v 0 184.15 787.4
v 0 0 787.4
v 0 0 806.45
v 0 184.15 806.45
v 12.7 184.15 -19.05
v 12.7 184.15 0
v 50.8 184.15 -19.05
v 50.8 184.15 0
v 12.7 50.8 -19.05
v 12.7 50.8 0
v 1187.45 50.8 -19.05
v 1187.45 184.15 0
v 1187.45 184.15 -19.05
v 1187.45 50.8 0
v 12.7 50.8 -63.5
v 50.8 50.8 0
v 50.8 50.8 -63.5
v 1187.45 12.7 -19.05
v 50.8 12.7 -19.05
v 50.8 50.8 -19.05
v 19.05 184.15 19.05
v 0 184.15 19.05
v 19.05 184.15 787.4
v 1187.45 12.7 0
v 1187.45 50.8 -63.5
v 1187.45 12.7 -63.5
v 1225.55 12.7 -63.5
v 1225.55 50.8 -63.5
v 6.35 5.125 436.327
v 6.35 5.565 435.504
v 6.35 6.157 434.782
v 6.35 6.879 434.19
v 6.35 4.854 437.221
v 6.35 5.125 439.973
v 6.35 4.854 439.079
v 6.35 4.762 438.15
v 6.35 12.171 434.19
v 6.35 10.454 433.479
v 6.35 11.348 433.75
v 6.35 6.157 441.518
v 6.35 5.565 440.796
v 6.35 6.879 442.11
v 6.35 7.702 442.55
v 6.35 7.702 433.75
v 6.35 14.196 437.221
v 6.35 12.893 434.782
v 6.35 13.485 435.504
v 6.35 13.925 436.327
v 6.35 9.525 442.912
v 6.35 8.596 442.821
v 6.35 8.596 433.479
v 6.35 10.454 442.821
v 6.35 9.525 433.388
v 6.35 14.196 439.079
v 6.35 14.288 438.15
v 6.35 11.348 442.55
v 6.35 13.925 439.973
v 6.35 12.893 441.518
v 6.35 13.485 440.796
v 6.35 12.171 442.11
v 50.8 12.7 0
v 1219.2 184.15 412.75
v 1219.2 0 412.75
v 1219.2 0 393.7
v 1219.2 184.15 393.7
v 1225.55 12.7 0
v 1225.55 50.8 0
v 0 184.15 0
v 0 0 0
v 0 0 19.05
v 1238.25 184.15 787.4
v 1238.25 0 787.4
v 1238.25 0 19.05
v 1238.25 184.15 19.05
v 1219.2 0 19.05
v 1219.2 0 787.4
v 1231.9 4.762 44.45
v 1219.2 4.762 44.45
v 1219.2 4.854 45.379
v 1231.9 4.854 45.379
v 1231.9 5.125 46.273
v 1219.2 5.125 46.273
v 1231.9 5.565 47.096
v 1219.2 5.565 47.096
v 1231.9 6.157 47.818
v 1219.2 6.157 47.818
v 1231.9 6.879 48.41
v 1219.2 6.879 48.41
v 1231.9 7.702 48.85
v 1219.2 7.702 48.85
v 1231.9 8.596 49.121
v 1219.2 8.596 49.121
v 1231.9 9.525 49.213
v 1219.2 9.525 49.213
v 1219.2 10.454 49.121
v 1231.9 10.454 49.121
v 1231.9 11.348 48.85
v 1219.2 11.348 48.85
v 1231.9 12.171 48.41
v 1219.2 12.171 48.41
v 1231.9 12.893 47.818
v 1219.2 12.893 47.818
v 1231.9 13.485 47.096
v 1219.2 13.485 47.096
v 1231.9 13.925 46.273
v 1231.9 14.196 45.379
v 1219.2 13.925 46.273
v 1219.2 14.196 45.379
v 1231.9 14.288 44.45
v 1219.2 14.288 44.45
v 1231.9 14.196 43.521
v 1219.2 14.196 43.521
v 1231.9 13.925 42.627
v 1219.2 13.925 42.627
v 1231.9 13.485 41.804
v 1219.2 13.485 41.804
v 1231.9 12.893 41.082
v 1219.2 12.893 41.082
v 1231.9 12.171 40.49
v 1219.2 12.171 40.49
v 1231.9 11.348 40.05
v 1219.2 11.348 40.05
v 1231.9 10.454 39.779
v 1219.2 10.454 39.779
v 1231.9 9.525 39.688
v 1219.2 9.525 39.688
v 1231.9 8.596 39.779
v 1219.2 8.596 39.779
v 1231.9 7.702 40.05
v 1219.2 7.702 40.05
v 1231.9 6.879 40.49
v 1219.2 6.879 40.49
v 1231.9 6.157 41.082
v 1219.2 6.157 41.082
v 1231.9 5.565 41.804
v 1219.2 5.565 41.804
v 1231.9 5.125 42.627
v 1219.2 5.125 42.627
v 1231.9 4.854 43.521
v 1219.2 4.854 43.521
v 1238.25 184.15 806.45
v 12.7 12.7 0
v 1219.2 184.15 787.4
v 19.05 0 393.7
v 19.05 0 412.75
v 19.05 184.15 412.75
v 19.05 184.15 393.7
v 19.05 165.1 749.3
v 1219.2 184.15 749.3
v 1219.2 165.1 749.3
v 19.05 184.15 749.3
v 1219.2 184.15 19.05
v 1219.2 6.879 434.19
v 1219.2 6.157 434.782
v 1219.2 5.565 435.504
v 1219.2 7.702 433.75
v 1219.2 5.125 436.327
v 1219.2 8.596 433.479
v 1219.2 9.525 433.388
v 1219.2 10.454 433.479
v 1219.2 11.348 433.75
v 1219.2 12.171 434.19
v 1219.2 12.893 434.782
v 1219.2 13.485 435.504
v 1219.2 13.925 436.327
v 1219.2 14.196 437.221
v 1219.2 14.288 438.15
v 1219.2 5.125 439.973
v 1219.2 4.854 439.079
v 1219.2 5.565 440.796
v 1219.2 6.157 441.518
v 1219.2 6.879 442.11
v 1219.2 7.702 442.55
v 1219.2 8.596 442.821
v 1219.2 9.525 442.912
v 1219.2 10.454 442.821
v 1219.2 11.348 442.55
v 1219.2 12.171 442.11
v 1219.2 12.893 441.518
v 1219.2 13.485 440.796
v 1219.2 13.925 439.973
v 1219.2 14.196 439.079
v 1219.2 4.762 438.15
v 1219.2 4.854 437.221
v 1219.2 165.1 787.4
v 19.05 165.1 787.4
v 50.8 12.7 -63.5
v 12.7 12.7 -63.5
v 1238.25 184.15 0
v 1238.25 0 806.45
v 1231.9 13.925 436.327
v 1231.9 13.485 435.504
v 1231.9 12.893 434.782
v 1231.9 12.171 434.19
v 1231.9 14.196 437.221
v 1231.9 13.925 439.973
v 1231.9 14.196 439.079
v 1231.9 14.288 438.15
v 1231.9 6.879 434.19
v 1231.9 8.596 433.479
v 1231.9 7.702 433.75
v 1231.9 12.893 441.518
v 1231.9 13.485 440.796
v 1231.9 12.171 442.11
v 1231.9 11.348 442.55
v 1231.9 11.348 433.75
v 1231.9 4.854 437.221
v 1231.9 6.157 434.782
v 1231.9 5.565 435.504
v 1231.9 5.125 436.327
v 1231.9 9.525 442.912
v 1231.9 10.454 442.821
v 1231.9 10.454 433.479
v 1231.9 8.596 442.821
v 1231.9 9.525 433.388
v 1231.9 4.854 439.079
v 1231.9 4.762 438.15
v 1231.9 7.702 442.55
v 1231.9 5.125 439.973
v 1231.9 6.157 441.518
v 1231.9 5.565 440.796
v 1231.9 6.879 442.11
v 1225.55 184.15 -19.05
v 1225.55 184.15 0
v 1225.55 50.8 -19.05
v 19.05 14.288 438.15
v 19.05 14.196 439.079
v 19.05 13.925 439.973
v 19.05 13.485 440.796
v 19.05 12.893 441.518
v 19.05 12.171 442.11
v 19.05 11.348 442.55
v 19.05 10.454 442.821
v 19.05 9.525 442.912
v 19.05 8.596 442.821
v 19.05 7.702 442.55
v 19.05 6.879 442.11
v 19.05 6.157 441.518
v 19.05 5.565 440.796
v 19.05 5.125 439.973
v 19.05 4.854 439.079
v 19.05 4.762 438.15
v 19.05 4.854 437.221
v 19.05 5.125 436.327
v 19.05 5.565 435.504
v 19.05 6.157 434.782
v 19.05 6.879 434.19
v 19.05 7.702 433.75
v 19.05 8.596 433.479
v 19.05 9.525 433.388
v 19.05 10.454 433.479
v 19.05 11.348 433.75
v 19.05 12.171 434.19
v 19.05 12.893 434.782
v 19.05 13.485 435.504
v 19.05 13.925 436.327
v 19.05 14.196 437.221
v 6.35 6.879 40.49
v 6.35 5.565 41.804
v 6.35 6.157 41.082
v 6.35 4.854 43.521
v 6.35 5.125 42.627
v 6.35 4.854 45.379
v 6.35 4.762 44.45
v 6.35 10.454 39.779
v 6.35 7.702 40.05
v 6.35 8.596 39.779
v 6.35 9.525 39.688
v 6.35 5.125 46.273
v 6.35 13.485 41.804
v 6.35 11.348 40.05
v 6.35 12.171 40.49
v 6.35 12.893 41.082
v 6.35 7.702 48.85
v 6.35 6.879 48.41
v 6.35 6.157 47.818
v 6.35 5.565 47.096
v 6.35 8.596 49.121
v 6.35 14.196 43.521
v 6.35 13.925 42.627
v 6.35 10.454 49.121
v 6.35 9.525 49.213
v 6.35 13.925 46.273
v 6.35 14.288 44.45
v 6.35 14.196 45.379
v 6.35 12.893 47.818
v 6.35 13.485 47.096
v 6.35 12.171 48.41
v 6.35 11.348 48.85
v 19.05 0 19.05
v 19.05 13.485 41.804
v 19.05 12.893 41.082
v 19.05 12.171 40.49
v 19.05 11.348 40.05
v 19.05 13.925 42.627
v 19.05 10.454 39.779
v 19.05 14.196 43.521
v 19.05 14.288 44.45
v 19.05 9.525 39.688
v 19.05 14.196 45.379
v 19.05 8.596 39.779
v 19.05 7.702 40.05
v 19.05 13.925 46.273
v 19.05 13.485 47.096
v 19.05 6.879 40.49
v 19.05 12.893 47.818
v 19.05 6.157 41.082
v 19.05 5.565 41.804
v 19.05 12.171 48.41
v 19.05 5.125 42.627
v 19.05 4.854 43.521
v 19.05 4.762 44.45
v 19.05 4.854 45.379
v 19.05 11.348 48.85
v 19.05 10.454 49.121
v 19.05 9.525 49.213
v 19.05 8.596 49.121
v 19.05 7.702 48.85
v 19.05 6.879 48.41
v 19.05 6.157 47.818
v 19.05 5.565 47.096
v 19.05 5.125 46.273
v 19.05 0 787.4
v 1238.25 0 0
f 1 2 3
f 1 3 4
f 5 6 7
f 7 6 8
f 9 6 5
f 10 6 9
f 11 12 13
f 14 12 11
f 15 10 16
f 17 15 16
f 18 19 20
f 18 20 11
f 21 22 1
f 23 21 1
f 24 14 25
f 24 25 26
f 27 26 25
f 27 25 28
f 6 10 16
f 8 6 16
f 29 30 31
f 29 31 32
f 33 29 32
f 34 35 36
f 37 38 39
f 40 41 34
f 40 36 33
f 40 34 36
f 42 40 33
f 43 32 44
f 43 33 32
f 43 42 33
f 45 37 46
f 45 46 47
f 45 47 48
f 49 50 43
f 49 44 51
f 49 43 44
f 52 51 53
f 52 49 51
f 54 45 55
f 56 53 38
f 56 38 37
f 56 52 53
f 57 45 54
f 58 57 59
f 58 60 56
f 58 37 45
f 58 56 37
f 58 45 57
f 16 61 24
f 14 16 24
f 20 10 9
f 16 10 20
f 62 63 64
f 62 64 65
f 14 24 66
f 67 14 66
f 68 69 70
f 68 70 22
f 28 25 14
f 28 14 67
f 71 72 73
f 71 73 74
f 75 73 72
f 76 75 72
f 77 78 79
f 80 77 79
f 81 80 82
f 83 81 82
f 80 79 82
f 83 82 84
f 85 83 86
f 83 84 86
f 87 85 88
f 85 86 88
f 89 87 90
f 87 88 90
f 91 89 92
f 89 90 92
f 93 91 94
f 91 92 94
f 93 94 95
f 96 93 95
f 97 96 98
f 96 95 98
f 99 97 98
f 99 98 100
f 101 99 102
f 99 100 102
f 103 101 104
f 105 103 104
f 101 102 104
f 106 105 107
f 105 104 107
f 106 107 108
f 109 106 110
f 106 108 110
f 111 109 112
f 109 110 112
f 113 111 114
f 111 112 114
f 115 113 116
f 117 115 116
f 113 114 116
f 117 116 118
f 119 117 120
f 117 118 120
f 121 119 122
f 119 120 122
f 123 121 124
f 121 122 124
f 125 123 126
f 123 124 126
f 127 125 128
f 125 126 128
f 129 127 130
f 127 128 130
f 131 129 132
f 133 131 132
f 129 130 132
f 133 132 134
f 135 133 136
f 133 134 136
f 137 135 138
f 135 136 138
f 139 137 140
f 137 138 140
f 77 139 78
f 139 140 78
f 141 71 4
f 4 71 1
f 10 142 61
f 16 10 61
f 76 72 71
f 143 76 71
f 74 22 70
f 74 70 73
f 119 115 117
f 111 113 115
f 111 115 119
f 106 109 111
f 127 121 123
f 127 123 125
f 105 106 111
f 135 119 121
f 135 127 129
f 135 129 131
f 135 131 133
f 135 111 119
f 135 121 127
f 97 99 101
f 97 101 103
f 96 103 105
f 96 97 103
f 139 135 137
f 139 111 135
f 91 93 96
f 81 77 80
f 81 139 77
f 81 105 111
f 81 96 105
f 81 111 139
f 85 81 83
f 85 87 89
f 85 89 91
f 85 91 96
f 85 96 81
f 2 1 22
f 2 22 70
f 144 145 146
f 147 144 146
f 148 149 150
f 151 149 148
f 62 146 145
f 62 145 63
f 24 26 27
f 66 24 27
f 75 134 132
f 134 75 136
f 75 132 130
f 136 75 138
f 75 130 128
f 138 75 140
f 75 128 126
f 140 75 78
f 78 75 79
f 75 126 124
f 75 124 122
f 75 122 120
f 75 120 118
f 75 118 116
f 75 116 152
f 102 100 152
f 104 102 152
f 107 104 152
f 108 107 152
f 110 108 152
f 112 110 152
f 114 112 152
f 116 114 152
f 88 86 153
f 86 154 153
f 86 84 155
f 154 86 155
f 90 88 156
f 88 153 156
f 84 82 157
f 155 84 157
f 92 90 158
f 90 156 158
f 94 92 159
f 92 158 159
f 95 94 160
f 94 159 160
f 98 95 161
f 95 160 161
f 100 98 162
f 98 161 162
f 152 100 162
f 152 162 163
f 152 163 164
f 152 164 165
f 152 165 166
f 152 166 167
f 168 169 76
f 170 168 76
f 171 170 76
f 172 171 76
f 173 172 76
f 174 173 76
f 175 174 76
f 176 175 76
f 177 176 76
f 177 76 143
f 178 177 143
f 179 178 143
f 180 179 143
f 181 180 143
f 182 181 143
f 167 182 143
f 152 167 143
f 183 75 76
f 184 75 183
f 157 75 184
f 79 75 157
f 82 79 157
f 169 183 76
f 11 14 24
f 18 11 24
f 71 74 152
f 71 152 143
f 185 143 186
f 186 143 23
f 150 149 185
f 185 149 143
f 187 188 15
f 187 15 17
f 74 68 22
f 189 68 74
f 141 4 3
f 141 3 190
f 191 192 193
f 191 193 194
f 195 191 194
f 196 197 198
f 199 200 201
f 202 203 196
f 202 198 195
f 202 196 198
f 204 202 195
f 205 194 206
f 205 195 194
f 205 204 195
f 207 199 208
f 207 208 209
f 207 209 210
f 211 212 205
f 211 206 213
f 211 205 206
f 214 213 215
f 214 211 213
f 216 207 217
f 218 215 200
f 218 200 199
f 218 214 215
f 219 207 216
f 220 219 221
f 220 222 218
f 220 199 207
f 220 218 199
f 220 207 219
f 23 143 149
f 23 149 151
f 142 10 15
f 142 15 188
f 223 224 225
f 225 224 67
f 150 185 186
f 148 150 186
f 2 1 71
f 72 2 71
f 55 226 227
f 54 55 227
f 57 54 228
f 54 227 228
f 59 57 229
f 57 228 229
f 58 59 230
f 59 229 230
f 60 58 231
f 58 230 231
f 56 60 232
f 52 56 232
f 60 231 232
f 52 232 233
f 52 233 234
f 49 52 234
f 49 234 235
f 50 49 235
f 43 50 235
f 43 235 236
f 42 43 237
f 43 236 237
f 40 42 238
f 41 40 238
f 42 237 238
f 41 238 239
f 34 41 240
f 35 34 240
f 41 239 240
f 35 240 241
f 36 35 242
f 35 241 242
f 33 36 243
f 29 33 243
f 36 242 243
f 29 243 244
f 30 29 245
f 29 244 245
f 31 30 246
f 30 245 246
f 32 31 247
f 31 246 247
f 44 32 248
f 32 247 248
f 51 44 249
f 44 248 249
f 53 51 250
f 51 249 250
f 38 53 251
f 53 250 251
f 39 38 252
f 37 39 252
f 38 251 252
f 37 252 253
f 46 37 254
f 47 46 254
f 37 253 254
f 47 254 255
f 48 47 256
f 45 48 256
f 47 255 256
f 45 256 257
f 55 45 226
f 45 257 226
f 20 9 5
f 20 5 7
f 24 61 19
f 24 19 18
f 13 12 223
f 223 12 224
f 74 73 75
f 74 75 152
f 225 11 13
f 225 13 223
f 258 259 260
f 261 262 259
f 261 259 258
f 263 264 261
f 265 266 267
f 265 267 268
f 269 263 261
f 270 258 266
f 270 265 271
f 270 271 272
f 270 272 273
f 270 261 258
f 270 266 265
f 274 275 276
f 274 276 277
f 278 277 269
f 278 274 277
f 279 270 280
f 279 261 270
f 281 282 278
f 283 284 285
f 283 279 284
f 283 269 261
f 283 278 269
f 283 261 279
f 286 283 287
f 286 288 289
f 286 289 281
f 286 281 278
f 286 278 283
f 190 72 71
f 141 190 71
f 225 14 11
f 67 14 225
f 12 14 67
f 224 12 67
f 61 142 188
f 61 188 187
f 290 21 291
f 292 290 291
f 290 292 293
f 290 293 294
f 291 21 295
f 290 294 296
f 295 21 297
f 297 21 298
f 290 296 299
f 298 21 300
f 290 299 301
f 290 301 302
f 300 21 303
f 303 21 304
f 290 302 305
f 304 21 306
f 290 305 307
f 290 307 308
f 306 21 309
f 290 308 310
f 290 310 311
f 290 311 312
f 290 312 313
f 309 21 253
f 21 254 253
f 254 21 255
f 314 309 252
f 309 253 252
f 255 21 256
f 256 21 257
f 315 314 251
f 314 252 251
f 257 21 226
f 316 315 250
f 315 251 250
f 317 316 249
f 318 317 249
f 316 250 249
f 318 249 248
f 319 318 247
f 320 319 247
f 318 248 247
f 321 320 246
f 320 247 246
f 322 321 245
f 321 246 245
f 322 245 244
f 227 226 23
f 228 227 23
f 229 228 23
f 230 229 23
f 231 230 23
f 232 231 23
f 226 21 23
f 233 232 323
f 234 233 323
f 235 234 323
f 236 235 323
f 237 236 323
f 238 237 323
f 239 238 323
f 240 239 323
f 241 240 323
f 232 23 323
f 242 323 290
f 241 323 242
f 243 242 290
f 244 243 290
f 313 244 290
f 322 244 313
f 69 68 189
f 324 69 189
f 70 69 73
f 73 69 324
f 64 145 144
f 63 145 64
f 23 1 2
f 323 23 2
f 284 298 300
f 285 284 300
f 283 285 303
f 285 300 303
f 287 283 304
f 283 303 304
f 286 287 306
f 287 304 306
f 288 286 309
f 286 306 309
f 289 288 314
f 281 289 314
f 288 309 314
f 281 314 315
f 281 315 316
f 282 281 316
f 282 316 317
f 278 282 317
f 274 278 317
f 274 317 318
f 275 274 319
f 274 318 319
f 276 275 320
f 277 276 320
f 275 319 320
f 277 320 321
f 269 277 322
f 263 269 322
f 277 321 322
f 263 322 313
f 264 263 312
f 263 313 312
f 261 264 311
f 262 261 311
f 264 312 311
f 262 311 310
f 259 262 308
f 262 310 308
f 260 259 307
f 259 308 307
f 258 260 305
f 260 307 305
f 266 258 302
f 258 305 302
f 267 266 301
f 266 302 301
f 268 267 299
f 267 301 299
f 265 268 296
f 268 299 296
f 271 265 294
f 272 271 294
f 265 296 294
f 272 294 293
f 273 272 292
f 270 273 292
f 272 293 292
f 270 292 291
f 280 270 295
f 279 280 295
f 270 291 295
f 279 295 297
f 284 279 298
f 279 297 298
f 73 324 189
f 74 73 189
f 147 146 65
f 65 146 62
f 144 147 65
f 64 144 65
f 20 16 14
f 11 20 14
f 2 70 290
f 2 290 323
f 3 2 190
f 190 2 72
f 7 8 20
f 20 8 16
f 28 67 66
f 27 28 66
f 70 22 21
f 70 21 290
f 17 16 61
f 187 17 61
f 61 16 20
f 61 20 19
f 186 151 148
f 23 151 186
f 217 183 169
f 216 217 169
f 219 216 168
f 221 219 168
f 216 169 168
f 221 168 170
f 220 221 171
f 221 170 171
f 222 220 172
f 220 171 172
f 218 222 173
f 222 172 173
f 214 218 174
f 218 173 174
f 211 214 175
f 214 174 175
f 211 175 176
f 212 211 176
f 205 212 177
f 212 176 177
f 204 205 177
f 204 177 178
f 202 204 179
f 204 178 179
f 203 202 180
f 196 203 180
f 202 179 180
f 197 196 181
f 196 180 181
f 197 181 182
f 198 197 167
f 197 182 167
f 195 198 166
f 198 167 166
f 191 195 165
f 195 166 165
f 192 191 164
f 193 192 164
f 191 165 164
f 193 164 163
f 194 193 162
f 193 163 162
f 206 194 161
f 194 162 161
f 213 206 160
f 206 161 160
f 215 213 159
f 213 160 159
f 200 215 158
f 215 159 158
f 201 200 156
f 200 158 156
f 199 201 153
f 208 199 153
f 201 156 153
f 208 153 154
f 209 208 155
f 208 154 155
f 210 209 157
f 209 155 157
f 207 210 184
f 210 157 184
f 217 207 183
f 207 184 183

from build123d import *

# Parameters (mm, degrees)
F0_W      = 1238.25
F0_H      = 184.15
F1_DEPTH  = 19.05
F2_W      = 184.15
F2_H      = 768.35
F3_DEPTH  = 19.05
F4_W      = 184.15
F4_H      = 768.35
F5_DEPTH  = 19.05
F6_W      = 1219.2
F6_H      = 184.15
F6_W_2    = 19.05
F7_DEPTH  = 19.05
F10_W     = 1200.15
F10_H     = 184.15
F11_DEPTH = 9.525
F12_W     = 1200.15
F12_H     = 38.1
F13_DEPTH = 19.05
F14_W     = 38.1
F14_H     = 38.1
F15_DEPTH = 63.5
F16_W     = 38.1
F16_H     = 38.1
F17_DEPTH = 63.5
F18_W     = 1136.65
F18_H     = 38.1
F19_DEPTH = 19.05
F20_W     = 38.1
F20_H     = 133.35
F21_DEPTH = 19.05
F22_W     = 38.1
F22_H     = 133.35
F23_DEPTH = 19.05
F24_R     = 4.7625
F25_DEPTH = 12.7
F26_R     = 4.7625
F27_DEPTH = 12.7
F28_R     = 4.7625
F29_DEPTH = 12.7
F30_R     = 4.7625
F31_DEPTH = 12.7


with BuildPart() as f1:
    # F0 (on Top) → F1 (new body)
    with BuildSketch(Plane.XY):
        with Locations((619.125, 92.075)):
            Rectangle(F0_W, F0_H)
    extrude(amount=F1_DEPTH)


with BuildPart() as f3:
    # F2 (on face) → F3 (new body)
    with BuildSketch(Plane(origin=(0, 0, 0), x_dir=(0, -1, 0), z_dir=(-1, 0, 0))):
        with Locations((-92.075, 403.225)):
            Rectangle(F2_W, F2_H)
    extrude(amount=-F3_DEPTH)

    # F24 (on face) → F25 (cut)
    with BuildSketch(Plane.YZ.offset(19.05)):
        with Locations((9.525, 438.15)):
            Circle(F24_R)
    extrude(amount=-F25_DEPTH, mode=Mode.SUBTRACT)

    # F28 (on face) → F29 (cut)
    with BuildSketch(Plane.YZ.offset(19.05)):
        with Locations((9.525, 44.45)):
            Circle(F28_R)
    extrude(amount=-F29_DEPTH, mode=Mode.SUBTRACT)


with BuildPart() as f5:
    # F4 (on face) → F5 (new body)
    with BuildSketch(Plane.YZ.offset(1238.25)):
        with Locations((92.075, 403.225)):
            Rectangle(F4_W, F4_H)
    extrude(amount=-F5_DEPTH)

    # F26 (on face) → F27 (cut)
    with BuildSketch(Plane(origin=(1219.2, 0, 0), x_dir=(0, -1, 0), z_dir=(-1, 0, 0))):
        with Locations((-9.525, 438.15)):
            Circle(F26_R)
    extrude(amount=-F27_DEPTH, mode=Mode.SUBTRACT)

    # F30 (on face) → F31 (cut)
    with BuildSketch(Plane(origin=(1219.2, 0, 0), x_dir=(0, -1, 0), z_dir=(-1, 0, 0))):
        with Locations((-9.525, 44.45)):
            Circle(F30_R)
    extrude(amount=-F31_DEPTH, mode=Mode.SUBTRACT)


with BuildPart() as f7:
    # F6 (on face) → F7 (new body)
    with BuildSketch(Plane.XY.offset(787.4)):
        with Locations((628.65, 92.075)):
            Rectangle(F6_W, F6_H)
        with Locations((9.525, 92.075)):
            Rectangle(F6_W_2, F6_H)
    extrude(amount=F7_DEPTH)


with BuildPart() as f11:
    # F10 (on plane+point) → F11 (new body, symmetric)
    with BuildSketch(Plane.XY.offset(403.225)):
        with Locations((619.125, 92.075)):
            Rectangle(F10_W, F10_H)
    extrude(amount=F11_DEPTH, both=True)


with BuildPart() as f13:
    # F12 (on face) → F13 (new body)
    with BuildSketch(Plane(origin=(0, 184.15, 0), x_dir=(-1, 0, 0), z_dir=(0, 1, 0))):
        with Locations((-619.125, 768.35)):
            Rectangle(F12_W, F12_H)
    extrude(amount=-F13_DEPTH)


with BuildPart() as f15:
    # F14 (on face) → F15 (new body)
    with BuildSketch(Plane(origin=(0, 0, 0), x_dir=(1, 0, 0), z_dir=(0, 0, -1))):
        with Locations((31.75, -31.75)):
            Rectangle(F14_W, F14_H)
    extrude(amount=F15_DEPTH)


with BuildPart() as f17:
    # F16 (on face) → F17 (new body, through all)
    with BuildSketch(Plane(origin=(0, 0, 0), x_dir=(1, 0, 0), z_dir=(0, 0, -1))):
        with Locations((1206.5, -31.75)):
            Rectangle(F16_W, F16_H)
    extrude(amount=F17_DEPTH)


with BuildPart() as f19:
    # F18 (on face) → F19 (new body)
    with BuildSketch(Plane(origin=(0, 0, 0), x_dir=(1, 0, 0), z_dir=(0, 0, -1))):
        with Locations((619.125, -31.75)):
            Rectangle(F18_W, F18_H)
    extrude(amount=F19_DEPTH)


with BuildPart() as f21:
    # F20 (on face) → F21 (new body)
    with BuildSketch(Plane(origin=(0, 0, 0), x_dir=(1, 0, 0), z_dir=(0, 0, -1))):
        with Locations((31.75, -117.475)):
            Rectangle(F20_W, F20_H)
    extrude(amount=F21_DEPTH)


with BuildPart() as f23:
    # F22 (on face) → F23 (new body)
    with BuildSketch(Plane(origin=(0, 0, 0), x_dir=(1, 0, 0), z_dir=(0, 0, -1))):
        with Locations((1206.5, -117.475)):
            Rectangle(F22_W, F22_H)
    extrude(amount=F23_DEPTH)


solid = Compound([f1.part, f3.part, f5.part, f7.part, f11.part, f13.part, f15.part, f17.part, f19.part, f21.part, f23.part])
